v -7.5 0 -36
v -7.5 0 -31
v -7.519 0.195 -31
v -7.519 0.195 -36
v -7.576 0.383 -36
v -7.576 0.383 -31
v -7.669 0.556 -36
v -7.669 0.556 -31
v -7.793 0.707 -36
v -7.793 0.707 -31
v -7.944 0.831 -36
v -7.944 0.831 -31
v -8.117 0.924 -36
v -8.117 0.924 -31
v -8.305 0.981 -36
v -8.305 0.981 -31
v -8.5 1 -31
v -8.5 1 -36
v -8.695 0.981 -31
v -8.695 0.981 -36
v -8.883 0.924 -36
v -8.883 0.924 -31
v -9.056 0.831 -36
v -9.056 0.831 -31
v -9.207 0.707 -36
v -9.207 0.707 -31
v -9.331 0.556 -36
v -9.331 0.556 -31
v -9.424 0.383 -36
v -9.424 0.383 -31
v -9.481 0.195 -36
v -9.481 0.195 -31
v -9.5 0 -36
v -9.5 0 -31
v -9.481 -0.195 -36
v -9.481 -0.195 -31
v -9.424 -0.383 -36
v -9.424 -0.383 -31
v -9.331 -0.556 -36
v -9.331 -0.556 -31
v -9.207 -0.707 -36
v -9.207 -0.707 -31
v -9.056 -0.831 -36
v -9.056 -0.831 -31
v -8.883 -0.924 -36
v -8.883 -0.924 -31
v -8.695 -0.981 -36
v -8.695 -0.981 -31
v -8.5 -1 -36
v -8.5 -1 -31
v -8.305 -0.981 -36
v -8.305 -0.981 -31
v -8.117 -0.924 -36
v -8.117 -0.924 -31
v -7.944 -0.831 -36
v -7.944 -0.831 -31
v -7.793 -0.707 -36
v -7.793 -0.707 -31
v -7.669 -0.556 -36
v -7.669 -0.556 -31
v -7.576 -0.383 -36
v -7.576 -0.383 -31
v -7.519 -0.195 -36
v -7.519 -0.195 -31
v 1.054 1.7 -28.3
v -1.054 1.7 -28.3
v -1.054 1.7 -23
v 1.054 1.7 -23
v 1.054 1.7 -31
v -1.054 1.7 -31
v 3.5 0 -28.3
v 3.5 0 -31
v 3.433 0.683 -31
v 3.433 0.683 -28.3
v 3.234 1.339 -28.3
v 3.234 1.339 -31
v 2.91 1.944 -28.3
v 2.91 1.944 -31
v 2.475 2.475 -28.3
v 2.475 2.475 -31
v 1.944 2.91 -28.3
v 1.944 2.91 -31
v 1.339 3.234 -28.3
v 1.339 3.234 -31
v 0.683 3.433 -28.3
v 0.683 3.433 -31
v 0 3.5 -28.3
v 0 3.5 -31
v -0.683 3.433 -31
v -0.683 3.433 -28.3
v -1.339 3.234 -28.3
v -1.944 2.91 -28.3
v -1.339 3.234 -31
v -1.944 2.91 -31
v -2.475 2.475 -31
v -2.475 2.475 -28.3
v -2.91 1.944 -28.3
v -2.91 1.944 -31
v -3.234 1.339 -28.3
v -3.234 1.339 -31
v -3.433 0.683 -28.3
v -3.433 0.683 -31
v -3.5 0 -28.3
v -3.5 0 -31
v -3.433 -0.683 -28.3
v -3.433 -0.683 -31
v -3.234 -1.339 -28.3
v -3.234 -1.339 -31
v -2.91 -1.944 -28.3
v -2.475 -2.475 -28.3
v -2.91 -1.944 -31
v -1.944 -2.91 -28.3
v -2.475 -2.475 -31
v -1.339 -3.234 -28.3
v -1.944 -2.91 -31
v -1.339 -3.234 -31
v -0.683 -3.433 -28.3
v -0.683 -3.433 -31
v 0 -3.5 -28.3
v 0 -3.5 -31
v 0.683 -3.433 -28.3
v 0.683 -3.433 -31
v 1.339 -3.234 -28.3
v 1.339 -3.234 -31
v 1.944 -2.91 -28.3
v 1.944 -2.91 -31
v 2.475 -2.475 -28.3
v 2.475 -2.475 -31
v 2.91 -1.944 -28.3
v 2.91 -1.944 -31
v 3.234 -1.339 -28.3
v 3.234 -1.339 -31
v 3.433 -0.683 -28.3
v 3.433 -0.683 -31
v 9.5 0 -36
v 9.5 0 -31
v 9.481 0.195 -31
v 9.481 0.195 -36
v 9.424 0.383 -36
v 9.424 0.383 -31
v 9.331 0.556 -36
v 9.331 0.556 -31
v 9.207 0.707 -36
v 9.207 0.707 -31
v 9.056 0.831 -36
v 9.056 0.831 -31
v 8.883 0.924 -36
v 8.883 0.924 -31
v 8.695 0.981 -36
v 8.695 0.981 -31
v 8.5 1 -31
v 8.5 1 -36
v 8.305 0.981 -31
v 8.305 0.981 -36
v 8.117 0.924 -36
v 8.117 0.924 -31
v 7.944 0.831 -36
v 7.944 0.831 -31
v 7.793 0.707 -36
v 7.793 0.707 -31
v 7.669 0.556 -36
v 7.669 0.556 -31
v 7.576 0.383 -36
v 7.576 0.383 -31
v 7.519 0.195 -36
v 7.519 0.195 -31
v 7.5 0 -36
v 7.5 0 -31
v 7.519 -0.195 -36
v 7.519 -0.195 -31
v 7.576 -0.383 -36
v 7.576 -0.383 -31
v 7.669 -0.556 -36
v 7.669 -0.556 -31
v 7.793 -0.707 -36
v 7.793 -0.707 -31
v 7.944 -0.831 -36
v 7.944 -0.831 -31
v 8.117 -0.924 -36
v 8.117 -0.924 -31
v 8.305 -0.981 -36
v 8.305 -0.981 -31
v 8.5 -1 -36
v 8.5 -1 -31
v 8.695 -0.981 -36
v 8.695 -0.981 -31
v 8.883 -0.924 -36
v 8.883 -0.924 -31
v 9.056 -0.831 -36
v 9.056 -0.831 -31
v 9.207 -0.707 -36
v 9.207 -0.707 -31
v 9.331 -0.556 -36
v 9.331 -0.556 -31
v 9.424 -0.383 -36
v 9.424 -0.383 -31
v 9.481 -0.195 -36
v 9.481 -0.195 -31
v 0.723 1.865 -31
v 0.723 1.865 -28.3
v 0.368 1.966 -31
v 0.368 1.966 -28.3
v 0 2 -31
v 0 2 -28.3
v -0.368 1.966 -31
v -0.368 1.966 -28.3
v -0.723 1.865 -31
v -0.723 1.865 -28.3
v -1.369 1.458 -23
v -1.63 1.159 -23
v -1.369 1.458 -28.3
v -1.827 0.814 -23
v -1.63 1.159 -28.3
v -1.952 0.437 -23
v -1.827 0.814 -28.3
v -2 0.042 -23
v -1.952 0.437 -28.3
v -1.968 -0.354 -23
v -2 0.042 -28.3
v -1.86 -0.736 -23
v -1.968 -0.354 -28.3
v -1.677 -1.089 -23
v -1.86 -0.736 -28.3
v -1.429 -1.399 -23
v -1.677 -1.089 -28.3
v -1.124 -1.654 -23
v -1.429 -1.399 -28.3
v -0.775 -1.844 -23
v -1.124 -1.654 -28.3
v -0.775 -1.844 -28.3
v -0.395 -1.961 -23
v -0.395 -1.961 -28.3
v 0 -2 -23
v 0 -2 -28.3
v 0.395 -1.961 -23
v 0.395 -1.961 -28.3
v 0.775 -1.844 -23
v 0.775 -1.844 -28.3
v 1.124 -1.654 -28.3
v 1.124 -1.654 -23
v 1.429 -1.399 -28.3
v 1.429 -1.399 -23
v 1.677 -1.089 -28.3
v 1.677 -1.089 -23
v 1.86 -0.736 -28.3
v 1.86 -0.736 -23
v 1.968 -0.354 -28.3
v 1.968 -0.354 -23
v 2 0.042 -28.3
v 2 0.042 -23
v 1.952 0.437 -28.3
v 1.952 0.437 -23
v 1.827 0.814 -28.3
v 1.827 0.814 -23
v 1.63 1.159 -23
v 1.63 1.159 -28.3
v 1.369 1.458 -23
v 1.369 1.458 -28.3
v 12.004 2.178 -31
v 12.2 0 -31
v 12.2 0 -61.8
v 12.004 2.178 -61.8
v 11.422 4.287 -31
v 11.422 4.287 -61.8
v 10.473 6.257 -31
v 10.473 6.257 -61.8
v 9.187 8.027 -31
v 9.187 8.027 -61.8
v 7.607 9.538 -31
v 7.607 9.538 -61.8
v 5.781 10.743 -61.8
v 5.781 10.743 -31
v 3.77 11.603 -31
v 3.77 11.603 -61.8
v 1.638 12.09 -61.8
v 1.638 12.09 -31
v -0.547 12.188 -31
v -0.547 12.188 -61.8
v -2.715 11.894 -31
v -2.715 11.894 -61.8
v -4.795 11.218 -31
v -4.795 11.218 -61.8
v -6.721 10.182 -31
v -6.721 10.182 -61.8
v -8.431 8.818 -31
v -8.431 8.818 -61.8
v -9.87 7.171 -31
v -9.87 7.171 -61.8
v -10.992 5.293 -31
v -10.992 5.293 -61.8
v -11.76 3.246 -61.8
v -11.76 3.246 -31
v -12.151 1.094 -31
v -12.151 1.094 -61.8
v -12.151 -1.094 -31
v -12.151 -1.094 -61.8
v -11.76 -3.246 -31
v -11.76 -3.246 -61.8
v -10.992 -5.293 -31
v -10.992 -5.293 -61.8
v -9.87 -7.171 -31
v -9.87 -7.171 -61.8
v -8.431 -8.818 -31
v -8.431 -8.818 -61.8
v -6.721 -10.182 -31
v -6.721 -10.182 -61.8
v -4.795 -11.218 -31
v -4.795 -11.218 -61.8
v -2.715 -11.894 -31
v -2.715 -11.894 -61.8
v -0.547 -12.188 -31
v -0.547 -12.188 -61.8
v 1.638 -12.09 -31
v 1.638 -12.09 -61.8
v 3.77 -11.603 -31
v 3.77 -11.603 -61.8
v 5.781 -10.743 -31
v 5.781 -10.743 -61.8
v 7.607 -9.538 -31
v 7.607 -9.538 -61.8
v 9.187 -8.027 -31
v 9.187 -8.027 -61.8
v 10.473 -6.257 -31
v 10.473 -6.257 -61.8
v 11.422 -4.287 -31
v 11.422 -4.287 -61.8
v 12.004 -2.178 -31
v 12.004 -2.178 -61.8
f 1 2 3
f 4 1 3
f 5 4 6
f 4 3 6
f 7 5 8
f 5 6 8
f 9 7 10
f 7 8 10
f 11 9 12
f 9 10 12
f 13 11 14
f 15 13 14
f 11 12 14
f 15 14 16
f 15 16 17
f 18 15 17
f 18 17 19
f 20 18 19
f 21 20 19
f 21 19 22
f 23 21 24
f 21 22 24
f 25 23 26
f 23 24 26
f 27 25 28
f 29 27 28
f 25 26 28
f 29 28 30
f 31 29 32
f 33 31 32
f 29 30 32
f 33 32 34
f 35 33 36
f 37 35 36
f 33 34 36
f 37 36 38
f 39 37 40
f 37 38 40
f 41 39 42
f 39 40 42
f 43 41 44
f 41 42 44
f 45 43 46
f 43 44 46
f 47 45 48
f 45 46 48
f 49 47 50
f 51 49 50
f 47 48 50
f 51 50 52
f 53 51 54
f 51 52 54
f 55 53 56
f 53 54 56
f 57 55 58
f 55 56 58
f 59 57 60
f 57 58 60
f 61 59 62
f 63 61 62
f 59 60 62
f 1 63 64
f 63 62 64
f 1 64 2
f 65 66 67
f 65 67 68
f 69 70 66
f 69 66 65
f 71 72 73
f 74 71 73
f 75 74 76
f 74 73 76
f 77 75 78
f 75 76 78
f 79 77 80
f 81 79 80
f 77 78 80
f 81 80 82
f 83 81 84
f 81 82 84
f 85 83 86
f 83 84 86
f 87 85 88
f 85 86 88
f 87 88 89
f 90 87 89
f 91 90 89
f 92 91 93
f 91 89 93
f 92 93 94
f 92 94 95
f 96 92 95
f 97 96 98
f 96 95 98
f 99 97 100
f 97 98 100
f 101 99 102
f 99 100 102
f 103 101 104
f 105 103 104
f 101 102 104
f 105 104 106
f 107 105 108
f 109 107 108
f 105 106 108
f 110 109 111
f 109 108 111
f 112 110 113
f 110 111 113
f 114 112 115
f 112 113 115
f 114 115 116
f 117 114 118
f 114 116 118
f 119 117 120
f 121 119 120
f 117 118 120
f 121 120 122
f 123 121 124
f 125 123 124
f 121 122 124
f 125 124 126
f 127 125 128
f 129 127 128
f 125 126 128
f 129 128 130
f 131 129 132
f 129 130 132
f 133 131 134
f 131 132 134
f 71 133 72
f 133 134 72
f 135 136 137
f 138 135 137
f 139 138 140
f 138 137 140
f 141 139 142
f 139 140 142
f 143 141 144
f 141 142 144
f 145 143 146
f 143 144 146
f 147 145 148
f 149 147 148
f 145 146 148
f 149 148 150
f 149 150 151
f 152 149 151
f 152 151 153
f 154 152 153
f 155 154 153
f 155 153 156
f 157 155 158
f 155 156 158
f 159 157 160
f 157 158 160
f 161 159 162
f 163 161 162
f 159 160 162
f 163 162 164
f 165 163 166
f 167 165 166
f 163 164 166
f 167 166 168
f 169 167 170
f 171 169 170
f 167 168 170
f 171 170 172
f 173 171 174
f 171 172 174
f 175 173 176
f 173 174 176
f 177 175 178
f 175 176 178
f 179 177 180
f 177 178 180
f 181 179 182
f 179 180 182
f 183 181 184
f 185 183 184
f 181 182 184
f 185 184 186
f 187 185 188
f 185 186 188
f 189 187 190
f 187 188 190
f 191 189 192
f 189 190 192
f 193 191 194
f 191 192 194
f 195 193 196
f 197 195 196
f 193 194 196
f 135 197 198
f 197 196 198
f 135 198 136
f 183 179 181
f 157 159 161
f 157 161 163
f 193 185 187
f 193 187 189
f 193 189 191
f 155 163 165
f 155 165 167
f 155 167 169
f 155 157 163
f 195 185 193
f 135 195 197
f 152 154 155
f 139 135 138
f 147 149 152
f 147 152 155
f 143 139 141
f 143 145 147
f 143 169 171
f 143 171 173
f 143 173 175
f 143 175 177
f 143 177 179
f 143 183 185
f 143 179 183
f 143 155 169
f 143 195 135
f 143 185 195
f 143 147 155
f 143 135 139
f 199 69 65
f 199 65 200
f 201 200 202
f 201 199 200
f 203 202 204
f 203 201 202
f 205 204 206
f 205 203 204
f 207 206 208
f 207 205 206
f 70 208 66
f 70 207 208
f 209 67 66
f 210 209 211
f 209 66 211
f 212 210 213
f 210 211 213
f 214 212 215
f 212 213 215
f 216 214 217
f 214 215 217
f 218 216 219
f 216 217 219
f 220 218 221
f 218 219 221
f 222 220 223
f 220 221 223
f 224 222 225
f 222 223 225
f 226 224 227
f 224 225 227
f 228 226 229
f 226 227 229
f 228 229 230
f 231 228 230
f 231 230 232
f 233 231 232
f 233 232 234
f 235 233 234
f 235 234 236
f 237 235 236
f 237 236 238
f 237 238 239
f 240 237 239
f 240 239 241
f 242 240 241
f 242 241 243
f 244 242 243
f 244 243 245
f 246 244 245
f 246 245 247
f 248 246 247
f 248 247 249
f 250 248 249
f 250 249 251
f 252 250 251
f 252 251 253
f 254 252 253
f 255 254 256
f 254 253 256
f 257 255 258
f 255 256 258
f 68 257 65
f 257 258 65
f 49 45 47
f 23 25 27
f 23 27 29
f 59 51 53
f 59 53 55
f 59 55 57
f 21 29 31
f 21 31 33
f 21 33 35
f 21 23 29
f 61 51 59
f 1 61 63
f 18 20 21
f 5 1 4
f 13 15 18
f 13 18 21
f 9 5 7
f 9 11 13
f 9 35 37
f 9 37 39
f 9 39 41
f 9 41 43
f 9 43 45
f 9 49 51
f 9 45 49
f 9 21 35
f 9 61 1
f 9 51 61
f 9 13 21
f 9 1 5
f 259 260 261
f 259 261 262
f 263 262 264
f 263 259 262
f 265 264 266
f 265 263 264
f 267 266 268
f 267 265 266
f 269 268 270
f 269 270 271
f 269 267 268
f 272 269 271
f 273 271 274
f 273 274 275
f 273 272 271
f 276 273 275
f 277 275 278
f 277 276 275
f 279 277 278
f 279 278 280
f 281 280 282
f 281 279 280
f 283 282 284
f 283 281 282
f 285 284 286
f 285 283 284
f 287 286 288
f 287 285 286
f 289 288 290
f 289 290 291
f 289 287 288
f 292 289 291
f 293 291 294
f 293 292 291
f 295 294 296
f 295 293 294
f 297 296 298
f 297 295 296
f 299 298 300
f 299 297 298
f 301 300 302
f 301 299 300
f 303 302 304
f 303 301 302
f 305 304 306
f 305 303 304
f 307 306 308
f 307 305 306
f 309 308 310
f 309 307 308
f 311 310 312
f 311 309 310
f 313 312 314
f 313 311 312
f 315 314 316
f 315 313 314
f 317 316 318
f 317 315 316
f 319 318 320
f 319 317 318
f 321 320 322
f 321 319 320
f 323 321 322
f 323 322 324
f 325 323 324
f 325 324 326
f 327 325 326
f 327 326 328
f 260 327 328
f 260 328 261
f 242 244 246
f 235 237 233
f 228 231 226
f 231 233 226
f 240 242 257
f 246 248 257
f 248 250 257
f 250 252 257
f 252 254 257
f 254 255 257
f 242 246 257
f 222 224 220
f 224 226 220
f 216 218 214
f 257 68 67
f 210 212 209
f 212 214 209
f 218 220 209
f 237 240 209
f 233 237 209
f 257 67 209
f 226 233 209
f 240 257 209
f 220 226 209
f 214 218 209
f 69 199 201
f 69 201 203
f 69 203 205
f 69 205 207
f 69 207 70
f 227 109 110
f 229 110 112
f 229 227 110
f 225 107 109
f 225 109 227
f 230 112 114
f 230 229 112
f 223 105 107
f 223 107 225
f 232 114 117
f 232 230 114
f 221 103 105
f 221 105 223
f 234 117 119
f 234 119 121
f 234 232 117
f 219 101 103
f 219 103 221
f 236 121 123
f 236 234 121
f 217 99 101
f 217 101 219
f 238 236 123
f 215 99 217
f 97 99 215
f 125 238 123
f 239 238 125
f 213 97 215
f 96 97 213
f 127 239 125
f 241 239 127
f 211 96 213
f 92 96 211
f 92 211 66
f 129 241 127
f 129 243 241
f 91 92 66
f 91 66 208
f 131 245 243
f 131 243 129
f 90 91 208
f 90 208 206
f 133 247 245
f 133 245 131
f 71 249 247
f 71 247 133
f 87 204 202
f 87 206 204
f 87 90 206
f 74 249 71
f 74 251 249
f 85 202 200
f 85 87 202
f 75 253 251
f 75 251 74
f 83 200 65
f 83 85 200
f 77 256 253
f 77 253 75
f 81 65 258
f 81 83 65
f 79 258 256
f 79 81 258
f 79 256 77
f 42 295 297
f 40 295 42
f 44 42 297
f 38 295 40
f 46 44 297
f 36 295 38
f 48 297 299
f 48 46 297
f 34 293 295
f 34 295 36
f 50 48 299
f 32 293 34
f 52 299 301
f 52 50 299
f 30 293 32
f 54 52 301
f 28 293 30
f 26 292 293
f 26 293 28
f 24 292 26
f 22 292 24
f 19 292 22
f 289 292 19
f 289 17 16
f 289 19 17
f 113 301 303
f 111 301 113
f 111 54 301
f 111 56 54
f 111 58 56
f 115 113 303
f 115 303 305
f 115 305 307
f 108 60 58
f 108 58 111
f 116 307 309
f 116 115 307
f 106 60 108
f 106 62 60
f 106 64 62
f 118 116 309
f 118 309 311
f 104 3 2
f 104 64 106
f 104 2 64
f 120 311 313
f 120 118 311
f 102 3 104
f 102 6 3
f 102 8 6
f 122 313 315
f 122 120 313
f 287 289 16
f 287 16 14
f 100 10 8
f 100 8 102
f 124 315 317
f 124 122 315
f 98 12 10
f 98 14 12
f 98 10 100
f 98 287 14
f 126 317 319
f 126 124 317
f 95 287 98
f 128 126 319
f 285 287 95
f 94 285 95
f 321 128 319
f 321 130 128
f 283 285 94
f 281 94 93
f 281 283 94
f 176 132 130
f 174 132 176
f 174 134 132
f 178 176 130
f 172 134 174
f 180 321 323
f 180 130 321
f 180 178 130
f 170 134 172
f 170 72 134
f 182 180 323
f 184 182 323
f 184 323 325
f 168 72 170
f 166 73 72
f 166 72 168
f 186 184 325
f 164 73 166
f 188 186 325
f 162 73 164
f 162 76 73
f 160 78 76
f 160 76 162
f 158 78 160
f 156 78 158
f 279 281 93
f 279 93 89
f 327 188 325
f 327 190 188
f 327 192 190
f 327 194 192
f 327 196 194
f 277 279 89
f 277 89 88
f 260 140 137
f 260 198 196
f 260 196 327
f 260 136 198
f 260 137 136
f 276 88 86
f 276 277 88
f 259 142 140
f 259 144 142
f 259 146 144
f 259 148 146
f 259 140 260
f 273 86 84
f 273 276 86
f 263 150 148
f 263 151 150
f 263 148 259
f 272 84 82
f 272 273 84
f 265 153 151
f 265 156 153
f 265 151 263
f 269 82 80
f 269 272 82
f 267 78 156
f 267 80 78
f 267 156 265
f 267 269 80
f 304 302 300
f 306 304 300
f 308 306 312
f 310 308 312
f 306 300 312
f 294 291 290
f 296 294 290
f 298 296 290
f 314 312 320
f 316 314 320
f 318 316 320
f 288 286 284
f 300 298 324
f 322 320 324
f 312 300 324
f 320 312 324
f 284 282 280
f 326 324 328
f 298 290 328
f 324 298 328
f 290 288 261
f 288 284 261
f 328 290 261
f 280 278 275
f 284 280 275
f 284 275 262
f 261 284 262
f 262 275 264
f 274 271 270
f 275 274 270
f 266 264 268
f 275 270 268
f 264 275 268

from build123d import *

# Parameters (mm, degrees)
SKETCH012_R     = 12.2
PAD010_DEPTH    = 30.8
PAD011_DEPTH    = 8
SKETCH014_R     = 1
POCKET002_DEPTH = 5
SKETCH015_R     = 3.5
SKETCH015_R_2   = 2
PAD012_DEPTH    = 2.7


with BuildPart() as part:
    # Sketch012 → Pad010 (new body)
    with BuildSketch(Plane.XY):
        Circle(SKETCH012_R)
    extrude(amount=-PAD010_DEPTH)

    # Sketch013 → Pad011 (join)
    with BuildSketch(Plane.XY):
        with BuildLine():
            Line((-1.0535656252, 1.6999998451), (1.0535656252, 1.6999998451))
            ThreePointArc((0, -2), (1.9235383659, -0.5477226989), (1.0535656252, 1.6999998451))
            ThreePointArc((-1.0535656252, 1.6999998451), (-1.9235383659, -0.5477226989), (0, -2))
        make_face()
    extrude(amount=PAD011_DEPTH)

    # Sketch014 (on Face2 of Pad011) → Pocket002 (cut)
    with BuildSketch(Plane.XY):
        with Locations((-8.5, 0)):
            Circle(SKETCH014_R)
        with Locations((8.5, 0)):
            Circle(SKETCH014_R)
    extrude(amount=-POCKET002_DEPTH, mode=Mode.SUBTRACT)

    # Sketch015 (on Face2 of Pocket002) → Pad012 (join)
    with BuildSketch(Plane.XY):
        Circle(SKETCH015_R)
        Circle(SKETCH015_R_2, mode=Mode.SUBTRACT)
    extrude(amount=PAD012_DEPTH)


with BuildPart() as part_1:
    # Body003 placement: moved
    add(part.part.moved(Location((0, 0, -31))))


solid = part_1.part
